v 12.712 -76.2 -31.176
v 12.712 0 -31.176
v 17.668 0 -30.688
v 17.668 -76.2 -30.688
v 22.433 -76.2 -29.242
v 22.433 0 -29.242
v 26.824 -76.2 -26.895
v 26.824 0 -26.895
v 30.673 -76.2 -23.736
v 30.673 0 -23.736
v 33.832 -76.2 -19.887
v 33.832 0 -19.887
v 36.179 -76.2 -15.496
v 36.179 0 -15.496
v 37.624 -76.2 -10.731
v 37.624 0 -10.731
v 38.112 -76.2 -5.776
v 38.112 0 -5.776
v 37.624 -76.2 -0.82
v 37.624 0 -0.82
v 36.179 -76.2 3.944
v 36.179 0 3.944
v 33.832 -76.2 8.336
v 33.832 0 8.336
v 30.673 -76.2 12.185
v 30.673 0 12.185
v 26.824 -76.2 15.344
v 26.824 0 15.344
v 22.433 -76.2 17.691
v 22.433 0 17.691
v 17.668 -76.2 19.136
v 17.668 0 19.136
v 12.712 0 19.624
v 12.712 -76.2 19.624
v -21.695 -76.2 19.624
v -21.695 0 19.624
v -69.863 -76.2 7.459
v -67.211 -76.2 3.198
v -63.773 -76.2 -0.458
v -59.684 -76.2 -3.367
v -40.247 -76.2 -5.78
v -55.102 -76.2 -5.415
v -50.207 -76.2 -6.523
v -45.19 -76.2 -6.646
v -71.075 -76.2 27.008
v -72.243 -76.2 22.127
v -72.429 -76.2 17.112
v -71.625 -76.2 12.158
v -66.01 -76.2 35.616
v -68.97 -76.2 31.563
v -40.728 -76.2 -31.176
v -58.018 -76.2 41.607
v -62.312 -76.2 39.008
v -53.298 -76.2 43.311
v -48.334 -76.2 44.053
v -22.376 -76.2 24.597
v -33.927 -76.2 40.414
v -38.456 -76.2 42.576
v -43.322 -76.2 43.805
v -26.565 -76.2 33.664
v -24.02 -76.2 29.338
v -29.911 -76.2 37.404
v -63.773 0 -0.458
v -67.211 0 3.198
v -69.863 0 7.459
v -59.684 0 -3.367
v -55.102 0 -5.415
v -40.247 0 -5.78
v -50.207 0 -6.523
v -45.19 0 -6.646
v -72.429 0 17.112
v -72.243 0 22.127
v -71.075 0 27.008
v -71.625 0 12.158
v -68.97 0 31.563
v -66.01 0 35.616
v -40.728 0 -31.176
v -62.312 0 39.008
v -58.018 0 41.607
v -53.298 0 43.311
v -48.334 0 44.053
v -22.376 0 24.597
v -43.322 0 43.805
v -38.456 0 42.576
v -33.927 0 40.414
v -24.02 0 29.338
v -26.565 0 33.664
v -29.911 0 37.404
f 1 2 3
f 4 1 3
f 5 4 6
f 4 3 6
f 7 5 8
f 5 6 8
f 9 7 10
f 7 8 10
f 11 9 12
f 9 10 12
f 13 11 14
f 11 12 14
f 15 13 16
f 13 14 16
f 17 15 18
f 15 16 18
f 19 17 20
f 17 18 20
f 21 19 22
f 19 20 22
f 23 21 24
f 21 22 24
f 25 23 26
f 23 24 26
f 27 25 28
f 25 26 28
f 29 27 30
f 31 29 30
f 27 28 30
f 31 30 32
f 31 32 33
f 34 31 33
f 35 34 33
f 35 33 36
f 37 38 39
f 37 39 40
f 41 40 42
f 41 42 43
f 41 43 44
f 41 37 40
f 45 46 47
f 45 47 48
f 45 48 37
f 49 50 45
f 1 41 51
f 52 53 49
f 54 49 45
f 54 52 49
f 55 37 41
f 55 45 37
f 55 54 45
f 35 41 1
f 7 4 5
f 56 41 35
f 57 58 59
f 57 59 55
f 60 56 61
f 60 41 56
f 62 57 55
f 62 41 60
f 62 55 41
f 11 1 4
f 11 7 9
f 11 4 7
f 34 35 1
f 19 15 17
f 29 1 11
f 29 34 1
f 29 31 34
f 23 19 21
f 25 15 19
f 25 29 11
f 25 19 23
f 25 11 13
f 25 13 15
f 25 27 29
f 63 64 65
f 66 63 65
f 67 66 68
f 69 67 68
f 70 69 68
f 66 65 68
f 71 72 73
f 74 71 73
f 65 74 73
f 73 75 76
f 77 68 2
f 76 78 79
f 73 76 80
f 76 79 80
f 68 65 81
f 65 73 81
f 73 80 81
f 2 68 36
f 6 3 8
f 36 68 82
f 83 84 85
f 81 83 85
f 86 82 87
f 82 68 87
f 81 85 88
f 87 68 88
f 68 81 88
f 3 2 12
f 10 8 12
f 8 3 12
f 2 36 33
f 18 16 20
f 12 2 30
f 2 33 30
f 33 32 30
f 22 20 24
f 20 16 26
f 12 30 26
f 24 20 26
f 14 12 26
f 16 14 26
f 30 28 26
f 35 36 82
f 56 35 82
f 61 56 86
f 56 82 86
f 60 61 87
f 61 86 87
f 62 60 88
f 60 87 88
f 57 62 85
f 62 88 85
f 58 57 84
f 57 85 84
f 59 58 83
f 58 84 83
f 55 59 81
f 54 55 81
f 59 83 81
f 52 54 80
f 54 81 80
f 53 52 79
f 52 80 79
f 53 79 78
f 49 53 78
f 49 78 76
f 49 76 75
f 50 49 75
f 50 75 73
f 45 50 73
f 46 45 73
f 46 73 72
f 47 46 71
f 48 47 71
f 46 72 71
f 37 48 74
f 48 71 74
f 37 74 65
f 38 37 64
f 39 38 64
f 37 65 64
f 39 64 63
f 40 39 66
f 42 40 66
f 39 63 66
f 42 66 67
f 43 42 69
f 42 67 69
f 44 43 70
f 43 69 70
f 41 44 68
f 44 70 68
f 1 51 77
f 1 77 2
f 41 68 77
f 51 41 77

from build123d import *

# Parameters (mm, degrees)
F1_DEPTH = 76.2


with BuildPart() as f1:
    # F0 (on Front) → F1 (new body)
    with BuildSketch(Plane.XZ):
        with BuildLine():
            Line((12.712441, 19.624272), (-21.695151, 19.624272))
            ThreePointArc((-21.695151, 19.624272), (-67.590624, 33.663258), (-40.246621, -5.780285))
            Line((-40.246621, -5.780285), (-40.727737, -31.175728))
            Line((-40.727737, -31.175728), (12.712441, -31.175728))
            ThreePointArc((12.712441, -31.175728), (38.112441, -5.775728), (12.712441, 19.624272))
        make_face()
    extrude(amount=F1_DEPTH)


solid = f1.part
